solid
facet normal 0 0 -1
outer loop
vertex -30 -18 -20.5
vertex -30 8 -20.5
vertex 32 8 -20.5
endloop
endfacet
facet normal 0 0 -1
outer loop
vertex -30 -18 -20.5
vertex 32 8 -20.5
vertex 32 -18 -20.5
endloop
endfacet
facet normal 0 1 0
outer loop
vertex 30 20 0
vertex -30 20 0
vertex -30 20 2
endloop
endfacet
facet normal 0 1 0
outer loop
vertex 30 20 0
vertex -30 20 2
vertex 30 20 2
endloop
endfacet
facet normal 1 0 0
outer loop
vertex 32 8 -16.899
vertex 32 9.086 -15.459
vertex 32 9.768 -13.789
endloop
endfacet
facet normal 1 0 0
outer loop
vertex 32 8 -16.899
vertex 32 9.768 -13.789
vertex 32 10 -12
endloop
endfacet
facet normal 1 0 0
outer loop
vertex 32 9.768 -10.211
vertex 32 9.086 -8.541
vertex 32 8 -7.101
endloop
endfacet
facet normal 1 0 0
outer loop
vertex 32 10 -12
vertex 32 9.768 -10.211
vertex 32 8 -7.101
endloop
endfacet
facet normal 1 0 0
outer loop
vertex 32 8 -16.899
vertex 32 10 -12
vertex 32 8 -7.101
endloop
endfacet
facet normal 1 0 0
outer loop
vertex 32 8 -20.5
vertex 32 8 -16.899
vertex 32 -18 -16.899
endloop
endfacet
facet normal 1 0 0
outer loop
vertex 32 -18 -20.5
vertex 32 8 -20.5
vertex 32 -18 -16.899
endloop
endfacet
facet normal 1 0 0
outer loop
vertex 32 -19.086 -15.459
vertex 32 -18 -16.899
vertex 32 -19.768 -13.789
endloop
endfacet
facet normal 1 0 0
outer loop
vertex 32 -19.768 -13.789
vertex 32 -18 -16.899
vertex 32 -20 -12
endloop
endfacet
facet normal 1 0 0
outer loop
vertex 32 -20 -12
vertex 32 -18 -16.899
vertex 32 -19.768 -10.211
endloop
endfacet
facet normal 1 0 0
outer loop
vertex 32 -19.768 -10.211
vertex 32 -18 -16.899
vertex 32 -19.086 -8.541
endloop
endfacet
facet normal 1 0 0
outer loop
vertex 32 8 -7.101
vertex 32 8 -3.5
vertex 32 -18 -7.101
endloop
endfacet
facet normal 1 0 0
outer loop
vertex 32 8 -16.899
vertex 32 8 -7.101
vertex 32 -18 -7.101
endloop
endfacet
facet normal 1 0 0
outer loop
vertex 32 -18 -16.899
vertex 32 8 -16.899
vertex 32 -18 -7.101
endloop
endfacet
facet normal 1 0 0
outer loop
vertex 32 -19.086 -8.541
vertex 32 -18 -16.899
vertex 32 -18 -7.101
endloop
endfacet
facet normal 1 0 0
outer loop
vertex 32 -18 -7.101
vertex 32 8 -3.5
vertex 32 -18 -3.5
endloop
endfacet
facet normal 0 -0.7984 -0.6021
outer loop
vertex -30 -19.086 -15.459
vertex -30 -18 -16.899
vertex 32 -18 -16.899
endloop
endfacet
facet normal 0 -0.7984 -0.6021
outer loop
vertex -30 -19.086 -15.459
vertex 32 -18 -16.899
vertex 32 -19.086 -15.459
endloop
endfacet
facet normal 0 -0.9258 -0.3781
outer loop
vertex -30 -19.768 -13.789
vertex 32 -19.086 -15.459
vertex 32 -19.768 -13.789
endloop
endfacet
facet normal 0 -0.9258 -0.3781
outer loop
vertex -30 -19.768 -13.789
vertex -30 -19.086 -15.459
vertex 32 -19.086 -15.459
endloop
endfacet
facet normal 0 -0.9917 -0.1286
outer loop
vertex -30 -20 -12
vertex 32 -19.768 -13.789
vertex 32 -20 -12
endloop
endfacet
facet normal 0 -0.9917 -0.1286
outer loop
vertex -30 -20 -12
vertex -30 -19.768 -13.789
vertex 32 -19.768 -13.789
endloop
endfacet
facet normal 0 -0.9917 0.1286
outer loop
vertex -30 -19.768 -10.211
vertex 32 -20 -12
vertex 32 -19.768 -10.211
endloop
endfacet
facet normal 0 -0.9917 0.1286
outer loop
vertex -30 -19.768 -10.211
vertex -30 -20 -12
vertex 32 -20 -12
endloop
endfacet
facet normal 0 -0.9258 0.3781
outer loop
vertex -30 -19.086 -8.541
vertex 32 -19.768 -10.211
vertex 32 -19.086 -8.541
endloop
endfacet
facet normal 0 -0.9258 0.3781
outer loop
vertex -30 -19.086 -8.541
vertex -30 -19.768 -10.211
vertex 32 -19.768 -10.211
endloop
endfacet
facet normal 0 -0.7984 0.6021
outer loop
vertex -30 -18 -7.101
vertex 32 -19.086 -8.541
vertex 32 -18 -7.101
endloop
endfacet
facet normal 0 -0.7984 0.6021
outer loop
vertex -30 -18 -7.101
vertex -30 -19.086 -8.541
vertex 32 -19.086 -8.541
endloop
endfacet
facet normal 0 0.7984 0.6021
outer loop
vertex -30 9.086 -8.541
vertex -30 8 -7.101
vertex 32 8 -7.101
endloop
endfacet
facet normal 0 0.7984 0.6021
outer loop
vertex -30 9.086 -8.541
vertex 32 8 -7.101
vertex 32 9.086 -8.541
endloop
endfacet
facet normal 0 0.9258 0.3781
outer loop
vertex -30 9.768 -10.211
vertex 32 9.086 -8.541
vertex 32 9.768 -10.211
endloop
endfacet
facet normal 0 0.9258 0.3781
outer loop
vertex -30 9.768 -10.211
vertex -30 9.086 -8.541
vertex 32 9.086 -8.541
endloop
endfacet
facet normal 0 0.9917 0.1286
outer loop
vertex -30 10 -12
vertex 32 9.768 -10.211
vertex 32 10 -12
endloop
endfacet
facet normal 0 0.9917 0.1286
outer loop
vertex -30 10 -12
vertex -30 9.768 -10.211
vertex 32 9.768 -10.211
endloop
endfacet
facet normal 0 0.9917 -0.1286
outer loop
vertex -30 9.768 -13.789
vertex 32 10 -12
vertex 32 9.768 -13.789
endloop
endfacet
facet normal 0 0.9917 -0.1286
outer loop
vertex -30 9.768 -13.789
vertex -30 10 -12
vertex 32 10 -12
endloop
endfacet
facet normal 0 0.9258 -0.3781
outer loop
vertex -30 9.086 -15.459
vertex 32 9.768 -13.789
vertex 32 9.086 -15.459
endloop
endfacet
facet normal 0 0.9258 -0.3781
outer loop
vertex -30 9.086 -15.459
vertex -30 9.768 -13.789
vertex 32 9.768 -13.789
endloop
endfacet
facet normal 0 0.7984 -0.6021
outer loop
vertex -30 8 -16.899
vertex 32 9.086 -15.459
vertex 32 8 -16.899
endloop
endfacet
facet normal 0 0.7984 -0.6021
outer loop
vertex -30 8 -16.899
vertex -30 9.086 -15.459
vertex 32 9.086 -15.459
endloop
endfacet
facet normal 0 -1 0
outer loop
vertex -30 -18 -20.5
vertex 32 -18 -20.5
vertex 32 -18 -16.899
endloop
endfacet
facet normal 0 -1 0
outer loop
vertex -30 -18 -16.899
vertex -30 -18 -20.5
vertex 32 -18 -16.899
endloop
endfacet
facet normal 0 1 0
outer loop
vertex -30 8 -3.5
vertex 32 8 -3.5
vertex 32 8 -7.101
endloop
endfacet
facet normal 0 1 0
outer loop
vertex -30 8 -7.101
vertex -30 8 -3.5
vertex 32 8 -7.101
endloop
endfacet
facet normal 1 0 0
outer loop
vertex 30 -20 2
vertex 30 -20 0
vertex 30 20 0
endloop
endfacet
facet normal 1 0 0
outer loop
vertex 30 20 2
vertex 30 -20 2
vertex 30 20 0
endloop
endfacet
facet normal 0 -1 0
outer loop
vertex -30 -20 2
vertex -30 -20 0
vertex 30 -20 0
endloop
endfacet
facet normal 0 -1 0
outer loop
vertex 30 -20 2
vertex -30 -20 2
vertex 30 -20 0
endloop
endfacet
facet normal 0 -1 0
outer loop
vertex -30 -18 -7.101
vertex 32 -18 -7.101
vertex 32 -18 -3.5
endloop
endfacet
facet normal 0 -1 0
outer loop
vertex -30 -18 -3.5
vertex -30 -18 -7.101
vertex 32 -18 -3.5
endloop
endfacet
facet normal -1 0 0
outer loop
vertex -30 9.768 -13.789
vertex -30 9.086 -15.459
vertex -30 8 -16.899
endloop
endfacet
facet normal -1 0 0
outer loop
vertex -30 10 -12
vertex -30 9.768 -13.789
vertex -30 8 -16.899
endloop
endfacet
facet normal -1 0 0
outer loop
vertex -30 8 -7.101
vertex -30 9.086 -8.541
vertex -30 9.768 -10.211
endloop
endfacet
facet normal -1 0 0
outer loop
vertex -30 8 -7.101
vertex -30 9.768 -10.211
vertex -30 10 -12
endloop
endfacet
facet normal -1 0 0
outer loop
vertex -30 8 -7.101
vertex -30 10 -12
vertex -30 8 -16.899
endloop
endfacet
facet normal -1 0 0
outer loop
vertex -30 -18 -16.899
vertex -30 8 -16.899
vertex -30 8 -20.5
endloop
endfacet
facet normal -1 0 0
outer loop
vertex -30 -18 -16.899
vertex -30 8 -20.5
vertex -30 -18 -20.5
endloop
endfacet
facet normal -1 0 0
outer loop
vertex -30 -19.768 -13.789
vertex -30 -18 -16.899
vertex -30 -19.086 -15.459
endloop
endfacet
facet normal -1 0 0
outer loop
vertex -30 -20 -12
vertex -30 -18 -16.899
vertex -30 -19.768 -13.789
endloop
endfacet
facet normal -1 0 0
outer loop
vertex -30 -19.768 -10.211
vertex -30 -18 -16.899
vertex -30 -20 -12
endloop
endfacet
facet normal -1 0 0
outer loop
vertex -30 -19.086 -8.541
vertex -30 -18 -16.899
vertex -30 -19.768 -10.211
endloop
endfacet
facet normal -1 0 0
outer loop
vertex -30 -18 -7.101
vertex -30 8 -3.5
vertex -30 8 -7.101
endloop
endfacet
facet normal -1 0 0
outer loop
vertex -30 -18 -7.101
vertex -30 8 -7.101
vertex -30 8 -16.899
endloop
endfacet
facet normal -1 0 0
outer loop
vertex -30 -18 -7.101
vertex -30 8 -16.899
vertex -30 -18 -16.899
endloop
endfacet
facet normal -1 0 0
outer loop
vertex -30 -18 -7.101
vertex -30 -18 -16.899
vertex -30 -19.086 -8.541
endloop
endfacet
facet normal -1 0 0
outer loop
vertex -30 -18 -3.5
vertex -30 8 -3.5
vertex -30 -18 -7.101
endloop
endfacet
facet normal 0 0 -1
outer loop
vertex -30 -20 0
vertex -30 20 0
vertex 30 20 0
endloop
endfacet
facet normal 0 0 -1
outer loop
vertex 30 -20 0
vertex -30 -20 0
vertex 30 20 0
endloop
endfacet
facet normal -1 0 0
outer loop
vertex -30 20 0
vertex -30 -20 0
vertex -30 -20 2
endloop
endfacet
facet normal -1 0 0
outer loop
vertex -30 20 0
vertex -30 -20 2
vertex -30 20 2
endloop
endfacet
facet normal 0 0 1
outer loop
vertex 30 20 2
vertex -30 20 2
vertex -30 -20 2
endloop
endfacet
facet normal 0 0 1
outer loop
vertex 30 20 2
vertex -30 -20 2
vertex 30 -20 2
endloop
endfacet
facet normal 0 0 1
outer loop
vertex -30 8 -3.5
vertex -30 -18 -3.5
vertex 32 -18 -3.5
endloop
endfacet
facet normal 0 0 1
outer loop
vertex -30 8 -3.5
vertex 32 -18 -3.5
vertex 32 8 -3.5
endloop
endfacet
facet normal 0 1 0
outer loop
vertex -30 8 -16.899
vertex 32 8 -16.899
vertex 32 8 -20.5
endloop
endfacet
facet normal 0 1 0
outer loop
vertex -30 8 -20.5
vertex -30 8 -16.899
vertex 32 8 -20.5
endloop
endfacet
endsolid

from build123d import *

# Parameters (mm, degrees)
F1_W     = 60
F1_H     = 40
F2_DEPTH = 2
F4_DEPTH = 62


with BuildPart() as f2:
    # F1 (on Top) → F2 (new body)
    with BuildSketch(Plane.XY):
        Rectangle(F1_W, F1_H)
    extrude(amount=F2_DEPTH)


with BuildPart() as f4:
    # F3 (on face) → F4 (new body)
    with BuildSketch(Plane(origin=(-30, 0, 0), x_dir=(0, -1, 0), z_dir=(-1, 0, 0))):
        with BuildLine():
            Line((-8, -3.5), (-8, -7.1010205144))
            ThreePointArc((-8, -7.1010205144), (-10, -12), (-8, -16.8989794856))
            Line((-8, -16.8989794856), (-8, -20.5))
            Line((-8, -20.5), (18, -20.5))
            Line((18, -20.5), (18, -16.8989794856))
            ThreePointArc((18, -16.8989794856), (20, -12), (18, -7.1010205144))
            Line((18, -7.1010205144), (18, -3.5))
            Line((18, -3.5), (-8, -3.5))
        make_face()
    extrude(amount=-F4_DEPTH)


solid = Compound([f2.part, f4.part])
